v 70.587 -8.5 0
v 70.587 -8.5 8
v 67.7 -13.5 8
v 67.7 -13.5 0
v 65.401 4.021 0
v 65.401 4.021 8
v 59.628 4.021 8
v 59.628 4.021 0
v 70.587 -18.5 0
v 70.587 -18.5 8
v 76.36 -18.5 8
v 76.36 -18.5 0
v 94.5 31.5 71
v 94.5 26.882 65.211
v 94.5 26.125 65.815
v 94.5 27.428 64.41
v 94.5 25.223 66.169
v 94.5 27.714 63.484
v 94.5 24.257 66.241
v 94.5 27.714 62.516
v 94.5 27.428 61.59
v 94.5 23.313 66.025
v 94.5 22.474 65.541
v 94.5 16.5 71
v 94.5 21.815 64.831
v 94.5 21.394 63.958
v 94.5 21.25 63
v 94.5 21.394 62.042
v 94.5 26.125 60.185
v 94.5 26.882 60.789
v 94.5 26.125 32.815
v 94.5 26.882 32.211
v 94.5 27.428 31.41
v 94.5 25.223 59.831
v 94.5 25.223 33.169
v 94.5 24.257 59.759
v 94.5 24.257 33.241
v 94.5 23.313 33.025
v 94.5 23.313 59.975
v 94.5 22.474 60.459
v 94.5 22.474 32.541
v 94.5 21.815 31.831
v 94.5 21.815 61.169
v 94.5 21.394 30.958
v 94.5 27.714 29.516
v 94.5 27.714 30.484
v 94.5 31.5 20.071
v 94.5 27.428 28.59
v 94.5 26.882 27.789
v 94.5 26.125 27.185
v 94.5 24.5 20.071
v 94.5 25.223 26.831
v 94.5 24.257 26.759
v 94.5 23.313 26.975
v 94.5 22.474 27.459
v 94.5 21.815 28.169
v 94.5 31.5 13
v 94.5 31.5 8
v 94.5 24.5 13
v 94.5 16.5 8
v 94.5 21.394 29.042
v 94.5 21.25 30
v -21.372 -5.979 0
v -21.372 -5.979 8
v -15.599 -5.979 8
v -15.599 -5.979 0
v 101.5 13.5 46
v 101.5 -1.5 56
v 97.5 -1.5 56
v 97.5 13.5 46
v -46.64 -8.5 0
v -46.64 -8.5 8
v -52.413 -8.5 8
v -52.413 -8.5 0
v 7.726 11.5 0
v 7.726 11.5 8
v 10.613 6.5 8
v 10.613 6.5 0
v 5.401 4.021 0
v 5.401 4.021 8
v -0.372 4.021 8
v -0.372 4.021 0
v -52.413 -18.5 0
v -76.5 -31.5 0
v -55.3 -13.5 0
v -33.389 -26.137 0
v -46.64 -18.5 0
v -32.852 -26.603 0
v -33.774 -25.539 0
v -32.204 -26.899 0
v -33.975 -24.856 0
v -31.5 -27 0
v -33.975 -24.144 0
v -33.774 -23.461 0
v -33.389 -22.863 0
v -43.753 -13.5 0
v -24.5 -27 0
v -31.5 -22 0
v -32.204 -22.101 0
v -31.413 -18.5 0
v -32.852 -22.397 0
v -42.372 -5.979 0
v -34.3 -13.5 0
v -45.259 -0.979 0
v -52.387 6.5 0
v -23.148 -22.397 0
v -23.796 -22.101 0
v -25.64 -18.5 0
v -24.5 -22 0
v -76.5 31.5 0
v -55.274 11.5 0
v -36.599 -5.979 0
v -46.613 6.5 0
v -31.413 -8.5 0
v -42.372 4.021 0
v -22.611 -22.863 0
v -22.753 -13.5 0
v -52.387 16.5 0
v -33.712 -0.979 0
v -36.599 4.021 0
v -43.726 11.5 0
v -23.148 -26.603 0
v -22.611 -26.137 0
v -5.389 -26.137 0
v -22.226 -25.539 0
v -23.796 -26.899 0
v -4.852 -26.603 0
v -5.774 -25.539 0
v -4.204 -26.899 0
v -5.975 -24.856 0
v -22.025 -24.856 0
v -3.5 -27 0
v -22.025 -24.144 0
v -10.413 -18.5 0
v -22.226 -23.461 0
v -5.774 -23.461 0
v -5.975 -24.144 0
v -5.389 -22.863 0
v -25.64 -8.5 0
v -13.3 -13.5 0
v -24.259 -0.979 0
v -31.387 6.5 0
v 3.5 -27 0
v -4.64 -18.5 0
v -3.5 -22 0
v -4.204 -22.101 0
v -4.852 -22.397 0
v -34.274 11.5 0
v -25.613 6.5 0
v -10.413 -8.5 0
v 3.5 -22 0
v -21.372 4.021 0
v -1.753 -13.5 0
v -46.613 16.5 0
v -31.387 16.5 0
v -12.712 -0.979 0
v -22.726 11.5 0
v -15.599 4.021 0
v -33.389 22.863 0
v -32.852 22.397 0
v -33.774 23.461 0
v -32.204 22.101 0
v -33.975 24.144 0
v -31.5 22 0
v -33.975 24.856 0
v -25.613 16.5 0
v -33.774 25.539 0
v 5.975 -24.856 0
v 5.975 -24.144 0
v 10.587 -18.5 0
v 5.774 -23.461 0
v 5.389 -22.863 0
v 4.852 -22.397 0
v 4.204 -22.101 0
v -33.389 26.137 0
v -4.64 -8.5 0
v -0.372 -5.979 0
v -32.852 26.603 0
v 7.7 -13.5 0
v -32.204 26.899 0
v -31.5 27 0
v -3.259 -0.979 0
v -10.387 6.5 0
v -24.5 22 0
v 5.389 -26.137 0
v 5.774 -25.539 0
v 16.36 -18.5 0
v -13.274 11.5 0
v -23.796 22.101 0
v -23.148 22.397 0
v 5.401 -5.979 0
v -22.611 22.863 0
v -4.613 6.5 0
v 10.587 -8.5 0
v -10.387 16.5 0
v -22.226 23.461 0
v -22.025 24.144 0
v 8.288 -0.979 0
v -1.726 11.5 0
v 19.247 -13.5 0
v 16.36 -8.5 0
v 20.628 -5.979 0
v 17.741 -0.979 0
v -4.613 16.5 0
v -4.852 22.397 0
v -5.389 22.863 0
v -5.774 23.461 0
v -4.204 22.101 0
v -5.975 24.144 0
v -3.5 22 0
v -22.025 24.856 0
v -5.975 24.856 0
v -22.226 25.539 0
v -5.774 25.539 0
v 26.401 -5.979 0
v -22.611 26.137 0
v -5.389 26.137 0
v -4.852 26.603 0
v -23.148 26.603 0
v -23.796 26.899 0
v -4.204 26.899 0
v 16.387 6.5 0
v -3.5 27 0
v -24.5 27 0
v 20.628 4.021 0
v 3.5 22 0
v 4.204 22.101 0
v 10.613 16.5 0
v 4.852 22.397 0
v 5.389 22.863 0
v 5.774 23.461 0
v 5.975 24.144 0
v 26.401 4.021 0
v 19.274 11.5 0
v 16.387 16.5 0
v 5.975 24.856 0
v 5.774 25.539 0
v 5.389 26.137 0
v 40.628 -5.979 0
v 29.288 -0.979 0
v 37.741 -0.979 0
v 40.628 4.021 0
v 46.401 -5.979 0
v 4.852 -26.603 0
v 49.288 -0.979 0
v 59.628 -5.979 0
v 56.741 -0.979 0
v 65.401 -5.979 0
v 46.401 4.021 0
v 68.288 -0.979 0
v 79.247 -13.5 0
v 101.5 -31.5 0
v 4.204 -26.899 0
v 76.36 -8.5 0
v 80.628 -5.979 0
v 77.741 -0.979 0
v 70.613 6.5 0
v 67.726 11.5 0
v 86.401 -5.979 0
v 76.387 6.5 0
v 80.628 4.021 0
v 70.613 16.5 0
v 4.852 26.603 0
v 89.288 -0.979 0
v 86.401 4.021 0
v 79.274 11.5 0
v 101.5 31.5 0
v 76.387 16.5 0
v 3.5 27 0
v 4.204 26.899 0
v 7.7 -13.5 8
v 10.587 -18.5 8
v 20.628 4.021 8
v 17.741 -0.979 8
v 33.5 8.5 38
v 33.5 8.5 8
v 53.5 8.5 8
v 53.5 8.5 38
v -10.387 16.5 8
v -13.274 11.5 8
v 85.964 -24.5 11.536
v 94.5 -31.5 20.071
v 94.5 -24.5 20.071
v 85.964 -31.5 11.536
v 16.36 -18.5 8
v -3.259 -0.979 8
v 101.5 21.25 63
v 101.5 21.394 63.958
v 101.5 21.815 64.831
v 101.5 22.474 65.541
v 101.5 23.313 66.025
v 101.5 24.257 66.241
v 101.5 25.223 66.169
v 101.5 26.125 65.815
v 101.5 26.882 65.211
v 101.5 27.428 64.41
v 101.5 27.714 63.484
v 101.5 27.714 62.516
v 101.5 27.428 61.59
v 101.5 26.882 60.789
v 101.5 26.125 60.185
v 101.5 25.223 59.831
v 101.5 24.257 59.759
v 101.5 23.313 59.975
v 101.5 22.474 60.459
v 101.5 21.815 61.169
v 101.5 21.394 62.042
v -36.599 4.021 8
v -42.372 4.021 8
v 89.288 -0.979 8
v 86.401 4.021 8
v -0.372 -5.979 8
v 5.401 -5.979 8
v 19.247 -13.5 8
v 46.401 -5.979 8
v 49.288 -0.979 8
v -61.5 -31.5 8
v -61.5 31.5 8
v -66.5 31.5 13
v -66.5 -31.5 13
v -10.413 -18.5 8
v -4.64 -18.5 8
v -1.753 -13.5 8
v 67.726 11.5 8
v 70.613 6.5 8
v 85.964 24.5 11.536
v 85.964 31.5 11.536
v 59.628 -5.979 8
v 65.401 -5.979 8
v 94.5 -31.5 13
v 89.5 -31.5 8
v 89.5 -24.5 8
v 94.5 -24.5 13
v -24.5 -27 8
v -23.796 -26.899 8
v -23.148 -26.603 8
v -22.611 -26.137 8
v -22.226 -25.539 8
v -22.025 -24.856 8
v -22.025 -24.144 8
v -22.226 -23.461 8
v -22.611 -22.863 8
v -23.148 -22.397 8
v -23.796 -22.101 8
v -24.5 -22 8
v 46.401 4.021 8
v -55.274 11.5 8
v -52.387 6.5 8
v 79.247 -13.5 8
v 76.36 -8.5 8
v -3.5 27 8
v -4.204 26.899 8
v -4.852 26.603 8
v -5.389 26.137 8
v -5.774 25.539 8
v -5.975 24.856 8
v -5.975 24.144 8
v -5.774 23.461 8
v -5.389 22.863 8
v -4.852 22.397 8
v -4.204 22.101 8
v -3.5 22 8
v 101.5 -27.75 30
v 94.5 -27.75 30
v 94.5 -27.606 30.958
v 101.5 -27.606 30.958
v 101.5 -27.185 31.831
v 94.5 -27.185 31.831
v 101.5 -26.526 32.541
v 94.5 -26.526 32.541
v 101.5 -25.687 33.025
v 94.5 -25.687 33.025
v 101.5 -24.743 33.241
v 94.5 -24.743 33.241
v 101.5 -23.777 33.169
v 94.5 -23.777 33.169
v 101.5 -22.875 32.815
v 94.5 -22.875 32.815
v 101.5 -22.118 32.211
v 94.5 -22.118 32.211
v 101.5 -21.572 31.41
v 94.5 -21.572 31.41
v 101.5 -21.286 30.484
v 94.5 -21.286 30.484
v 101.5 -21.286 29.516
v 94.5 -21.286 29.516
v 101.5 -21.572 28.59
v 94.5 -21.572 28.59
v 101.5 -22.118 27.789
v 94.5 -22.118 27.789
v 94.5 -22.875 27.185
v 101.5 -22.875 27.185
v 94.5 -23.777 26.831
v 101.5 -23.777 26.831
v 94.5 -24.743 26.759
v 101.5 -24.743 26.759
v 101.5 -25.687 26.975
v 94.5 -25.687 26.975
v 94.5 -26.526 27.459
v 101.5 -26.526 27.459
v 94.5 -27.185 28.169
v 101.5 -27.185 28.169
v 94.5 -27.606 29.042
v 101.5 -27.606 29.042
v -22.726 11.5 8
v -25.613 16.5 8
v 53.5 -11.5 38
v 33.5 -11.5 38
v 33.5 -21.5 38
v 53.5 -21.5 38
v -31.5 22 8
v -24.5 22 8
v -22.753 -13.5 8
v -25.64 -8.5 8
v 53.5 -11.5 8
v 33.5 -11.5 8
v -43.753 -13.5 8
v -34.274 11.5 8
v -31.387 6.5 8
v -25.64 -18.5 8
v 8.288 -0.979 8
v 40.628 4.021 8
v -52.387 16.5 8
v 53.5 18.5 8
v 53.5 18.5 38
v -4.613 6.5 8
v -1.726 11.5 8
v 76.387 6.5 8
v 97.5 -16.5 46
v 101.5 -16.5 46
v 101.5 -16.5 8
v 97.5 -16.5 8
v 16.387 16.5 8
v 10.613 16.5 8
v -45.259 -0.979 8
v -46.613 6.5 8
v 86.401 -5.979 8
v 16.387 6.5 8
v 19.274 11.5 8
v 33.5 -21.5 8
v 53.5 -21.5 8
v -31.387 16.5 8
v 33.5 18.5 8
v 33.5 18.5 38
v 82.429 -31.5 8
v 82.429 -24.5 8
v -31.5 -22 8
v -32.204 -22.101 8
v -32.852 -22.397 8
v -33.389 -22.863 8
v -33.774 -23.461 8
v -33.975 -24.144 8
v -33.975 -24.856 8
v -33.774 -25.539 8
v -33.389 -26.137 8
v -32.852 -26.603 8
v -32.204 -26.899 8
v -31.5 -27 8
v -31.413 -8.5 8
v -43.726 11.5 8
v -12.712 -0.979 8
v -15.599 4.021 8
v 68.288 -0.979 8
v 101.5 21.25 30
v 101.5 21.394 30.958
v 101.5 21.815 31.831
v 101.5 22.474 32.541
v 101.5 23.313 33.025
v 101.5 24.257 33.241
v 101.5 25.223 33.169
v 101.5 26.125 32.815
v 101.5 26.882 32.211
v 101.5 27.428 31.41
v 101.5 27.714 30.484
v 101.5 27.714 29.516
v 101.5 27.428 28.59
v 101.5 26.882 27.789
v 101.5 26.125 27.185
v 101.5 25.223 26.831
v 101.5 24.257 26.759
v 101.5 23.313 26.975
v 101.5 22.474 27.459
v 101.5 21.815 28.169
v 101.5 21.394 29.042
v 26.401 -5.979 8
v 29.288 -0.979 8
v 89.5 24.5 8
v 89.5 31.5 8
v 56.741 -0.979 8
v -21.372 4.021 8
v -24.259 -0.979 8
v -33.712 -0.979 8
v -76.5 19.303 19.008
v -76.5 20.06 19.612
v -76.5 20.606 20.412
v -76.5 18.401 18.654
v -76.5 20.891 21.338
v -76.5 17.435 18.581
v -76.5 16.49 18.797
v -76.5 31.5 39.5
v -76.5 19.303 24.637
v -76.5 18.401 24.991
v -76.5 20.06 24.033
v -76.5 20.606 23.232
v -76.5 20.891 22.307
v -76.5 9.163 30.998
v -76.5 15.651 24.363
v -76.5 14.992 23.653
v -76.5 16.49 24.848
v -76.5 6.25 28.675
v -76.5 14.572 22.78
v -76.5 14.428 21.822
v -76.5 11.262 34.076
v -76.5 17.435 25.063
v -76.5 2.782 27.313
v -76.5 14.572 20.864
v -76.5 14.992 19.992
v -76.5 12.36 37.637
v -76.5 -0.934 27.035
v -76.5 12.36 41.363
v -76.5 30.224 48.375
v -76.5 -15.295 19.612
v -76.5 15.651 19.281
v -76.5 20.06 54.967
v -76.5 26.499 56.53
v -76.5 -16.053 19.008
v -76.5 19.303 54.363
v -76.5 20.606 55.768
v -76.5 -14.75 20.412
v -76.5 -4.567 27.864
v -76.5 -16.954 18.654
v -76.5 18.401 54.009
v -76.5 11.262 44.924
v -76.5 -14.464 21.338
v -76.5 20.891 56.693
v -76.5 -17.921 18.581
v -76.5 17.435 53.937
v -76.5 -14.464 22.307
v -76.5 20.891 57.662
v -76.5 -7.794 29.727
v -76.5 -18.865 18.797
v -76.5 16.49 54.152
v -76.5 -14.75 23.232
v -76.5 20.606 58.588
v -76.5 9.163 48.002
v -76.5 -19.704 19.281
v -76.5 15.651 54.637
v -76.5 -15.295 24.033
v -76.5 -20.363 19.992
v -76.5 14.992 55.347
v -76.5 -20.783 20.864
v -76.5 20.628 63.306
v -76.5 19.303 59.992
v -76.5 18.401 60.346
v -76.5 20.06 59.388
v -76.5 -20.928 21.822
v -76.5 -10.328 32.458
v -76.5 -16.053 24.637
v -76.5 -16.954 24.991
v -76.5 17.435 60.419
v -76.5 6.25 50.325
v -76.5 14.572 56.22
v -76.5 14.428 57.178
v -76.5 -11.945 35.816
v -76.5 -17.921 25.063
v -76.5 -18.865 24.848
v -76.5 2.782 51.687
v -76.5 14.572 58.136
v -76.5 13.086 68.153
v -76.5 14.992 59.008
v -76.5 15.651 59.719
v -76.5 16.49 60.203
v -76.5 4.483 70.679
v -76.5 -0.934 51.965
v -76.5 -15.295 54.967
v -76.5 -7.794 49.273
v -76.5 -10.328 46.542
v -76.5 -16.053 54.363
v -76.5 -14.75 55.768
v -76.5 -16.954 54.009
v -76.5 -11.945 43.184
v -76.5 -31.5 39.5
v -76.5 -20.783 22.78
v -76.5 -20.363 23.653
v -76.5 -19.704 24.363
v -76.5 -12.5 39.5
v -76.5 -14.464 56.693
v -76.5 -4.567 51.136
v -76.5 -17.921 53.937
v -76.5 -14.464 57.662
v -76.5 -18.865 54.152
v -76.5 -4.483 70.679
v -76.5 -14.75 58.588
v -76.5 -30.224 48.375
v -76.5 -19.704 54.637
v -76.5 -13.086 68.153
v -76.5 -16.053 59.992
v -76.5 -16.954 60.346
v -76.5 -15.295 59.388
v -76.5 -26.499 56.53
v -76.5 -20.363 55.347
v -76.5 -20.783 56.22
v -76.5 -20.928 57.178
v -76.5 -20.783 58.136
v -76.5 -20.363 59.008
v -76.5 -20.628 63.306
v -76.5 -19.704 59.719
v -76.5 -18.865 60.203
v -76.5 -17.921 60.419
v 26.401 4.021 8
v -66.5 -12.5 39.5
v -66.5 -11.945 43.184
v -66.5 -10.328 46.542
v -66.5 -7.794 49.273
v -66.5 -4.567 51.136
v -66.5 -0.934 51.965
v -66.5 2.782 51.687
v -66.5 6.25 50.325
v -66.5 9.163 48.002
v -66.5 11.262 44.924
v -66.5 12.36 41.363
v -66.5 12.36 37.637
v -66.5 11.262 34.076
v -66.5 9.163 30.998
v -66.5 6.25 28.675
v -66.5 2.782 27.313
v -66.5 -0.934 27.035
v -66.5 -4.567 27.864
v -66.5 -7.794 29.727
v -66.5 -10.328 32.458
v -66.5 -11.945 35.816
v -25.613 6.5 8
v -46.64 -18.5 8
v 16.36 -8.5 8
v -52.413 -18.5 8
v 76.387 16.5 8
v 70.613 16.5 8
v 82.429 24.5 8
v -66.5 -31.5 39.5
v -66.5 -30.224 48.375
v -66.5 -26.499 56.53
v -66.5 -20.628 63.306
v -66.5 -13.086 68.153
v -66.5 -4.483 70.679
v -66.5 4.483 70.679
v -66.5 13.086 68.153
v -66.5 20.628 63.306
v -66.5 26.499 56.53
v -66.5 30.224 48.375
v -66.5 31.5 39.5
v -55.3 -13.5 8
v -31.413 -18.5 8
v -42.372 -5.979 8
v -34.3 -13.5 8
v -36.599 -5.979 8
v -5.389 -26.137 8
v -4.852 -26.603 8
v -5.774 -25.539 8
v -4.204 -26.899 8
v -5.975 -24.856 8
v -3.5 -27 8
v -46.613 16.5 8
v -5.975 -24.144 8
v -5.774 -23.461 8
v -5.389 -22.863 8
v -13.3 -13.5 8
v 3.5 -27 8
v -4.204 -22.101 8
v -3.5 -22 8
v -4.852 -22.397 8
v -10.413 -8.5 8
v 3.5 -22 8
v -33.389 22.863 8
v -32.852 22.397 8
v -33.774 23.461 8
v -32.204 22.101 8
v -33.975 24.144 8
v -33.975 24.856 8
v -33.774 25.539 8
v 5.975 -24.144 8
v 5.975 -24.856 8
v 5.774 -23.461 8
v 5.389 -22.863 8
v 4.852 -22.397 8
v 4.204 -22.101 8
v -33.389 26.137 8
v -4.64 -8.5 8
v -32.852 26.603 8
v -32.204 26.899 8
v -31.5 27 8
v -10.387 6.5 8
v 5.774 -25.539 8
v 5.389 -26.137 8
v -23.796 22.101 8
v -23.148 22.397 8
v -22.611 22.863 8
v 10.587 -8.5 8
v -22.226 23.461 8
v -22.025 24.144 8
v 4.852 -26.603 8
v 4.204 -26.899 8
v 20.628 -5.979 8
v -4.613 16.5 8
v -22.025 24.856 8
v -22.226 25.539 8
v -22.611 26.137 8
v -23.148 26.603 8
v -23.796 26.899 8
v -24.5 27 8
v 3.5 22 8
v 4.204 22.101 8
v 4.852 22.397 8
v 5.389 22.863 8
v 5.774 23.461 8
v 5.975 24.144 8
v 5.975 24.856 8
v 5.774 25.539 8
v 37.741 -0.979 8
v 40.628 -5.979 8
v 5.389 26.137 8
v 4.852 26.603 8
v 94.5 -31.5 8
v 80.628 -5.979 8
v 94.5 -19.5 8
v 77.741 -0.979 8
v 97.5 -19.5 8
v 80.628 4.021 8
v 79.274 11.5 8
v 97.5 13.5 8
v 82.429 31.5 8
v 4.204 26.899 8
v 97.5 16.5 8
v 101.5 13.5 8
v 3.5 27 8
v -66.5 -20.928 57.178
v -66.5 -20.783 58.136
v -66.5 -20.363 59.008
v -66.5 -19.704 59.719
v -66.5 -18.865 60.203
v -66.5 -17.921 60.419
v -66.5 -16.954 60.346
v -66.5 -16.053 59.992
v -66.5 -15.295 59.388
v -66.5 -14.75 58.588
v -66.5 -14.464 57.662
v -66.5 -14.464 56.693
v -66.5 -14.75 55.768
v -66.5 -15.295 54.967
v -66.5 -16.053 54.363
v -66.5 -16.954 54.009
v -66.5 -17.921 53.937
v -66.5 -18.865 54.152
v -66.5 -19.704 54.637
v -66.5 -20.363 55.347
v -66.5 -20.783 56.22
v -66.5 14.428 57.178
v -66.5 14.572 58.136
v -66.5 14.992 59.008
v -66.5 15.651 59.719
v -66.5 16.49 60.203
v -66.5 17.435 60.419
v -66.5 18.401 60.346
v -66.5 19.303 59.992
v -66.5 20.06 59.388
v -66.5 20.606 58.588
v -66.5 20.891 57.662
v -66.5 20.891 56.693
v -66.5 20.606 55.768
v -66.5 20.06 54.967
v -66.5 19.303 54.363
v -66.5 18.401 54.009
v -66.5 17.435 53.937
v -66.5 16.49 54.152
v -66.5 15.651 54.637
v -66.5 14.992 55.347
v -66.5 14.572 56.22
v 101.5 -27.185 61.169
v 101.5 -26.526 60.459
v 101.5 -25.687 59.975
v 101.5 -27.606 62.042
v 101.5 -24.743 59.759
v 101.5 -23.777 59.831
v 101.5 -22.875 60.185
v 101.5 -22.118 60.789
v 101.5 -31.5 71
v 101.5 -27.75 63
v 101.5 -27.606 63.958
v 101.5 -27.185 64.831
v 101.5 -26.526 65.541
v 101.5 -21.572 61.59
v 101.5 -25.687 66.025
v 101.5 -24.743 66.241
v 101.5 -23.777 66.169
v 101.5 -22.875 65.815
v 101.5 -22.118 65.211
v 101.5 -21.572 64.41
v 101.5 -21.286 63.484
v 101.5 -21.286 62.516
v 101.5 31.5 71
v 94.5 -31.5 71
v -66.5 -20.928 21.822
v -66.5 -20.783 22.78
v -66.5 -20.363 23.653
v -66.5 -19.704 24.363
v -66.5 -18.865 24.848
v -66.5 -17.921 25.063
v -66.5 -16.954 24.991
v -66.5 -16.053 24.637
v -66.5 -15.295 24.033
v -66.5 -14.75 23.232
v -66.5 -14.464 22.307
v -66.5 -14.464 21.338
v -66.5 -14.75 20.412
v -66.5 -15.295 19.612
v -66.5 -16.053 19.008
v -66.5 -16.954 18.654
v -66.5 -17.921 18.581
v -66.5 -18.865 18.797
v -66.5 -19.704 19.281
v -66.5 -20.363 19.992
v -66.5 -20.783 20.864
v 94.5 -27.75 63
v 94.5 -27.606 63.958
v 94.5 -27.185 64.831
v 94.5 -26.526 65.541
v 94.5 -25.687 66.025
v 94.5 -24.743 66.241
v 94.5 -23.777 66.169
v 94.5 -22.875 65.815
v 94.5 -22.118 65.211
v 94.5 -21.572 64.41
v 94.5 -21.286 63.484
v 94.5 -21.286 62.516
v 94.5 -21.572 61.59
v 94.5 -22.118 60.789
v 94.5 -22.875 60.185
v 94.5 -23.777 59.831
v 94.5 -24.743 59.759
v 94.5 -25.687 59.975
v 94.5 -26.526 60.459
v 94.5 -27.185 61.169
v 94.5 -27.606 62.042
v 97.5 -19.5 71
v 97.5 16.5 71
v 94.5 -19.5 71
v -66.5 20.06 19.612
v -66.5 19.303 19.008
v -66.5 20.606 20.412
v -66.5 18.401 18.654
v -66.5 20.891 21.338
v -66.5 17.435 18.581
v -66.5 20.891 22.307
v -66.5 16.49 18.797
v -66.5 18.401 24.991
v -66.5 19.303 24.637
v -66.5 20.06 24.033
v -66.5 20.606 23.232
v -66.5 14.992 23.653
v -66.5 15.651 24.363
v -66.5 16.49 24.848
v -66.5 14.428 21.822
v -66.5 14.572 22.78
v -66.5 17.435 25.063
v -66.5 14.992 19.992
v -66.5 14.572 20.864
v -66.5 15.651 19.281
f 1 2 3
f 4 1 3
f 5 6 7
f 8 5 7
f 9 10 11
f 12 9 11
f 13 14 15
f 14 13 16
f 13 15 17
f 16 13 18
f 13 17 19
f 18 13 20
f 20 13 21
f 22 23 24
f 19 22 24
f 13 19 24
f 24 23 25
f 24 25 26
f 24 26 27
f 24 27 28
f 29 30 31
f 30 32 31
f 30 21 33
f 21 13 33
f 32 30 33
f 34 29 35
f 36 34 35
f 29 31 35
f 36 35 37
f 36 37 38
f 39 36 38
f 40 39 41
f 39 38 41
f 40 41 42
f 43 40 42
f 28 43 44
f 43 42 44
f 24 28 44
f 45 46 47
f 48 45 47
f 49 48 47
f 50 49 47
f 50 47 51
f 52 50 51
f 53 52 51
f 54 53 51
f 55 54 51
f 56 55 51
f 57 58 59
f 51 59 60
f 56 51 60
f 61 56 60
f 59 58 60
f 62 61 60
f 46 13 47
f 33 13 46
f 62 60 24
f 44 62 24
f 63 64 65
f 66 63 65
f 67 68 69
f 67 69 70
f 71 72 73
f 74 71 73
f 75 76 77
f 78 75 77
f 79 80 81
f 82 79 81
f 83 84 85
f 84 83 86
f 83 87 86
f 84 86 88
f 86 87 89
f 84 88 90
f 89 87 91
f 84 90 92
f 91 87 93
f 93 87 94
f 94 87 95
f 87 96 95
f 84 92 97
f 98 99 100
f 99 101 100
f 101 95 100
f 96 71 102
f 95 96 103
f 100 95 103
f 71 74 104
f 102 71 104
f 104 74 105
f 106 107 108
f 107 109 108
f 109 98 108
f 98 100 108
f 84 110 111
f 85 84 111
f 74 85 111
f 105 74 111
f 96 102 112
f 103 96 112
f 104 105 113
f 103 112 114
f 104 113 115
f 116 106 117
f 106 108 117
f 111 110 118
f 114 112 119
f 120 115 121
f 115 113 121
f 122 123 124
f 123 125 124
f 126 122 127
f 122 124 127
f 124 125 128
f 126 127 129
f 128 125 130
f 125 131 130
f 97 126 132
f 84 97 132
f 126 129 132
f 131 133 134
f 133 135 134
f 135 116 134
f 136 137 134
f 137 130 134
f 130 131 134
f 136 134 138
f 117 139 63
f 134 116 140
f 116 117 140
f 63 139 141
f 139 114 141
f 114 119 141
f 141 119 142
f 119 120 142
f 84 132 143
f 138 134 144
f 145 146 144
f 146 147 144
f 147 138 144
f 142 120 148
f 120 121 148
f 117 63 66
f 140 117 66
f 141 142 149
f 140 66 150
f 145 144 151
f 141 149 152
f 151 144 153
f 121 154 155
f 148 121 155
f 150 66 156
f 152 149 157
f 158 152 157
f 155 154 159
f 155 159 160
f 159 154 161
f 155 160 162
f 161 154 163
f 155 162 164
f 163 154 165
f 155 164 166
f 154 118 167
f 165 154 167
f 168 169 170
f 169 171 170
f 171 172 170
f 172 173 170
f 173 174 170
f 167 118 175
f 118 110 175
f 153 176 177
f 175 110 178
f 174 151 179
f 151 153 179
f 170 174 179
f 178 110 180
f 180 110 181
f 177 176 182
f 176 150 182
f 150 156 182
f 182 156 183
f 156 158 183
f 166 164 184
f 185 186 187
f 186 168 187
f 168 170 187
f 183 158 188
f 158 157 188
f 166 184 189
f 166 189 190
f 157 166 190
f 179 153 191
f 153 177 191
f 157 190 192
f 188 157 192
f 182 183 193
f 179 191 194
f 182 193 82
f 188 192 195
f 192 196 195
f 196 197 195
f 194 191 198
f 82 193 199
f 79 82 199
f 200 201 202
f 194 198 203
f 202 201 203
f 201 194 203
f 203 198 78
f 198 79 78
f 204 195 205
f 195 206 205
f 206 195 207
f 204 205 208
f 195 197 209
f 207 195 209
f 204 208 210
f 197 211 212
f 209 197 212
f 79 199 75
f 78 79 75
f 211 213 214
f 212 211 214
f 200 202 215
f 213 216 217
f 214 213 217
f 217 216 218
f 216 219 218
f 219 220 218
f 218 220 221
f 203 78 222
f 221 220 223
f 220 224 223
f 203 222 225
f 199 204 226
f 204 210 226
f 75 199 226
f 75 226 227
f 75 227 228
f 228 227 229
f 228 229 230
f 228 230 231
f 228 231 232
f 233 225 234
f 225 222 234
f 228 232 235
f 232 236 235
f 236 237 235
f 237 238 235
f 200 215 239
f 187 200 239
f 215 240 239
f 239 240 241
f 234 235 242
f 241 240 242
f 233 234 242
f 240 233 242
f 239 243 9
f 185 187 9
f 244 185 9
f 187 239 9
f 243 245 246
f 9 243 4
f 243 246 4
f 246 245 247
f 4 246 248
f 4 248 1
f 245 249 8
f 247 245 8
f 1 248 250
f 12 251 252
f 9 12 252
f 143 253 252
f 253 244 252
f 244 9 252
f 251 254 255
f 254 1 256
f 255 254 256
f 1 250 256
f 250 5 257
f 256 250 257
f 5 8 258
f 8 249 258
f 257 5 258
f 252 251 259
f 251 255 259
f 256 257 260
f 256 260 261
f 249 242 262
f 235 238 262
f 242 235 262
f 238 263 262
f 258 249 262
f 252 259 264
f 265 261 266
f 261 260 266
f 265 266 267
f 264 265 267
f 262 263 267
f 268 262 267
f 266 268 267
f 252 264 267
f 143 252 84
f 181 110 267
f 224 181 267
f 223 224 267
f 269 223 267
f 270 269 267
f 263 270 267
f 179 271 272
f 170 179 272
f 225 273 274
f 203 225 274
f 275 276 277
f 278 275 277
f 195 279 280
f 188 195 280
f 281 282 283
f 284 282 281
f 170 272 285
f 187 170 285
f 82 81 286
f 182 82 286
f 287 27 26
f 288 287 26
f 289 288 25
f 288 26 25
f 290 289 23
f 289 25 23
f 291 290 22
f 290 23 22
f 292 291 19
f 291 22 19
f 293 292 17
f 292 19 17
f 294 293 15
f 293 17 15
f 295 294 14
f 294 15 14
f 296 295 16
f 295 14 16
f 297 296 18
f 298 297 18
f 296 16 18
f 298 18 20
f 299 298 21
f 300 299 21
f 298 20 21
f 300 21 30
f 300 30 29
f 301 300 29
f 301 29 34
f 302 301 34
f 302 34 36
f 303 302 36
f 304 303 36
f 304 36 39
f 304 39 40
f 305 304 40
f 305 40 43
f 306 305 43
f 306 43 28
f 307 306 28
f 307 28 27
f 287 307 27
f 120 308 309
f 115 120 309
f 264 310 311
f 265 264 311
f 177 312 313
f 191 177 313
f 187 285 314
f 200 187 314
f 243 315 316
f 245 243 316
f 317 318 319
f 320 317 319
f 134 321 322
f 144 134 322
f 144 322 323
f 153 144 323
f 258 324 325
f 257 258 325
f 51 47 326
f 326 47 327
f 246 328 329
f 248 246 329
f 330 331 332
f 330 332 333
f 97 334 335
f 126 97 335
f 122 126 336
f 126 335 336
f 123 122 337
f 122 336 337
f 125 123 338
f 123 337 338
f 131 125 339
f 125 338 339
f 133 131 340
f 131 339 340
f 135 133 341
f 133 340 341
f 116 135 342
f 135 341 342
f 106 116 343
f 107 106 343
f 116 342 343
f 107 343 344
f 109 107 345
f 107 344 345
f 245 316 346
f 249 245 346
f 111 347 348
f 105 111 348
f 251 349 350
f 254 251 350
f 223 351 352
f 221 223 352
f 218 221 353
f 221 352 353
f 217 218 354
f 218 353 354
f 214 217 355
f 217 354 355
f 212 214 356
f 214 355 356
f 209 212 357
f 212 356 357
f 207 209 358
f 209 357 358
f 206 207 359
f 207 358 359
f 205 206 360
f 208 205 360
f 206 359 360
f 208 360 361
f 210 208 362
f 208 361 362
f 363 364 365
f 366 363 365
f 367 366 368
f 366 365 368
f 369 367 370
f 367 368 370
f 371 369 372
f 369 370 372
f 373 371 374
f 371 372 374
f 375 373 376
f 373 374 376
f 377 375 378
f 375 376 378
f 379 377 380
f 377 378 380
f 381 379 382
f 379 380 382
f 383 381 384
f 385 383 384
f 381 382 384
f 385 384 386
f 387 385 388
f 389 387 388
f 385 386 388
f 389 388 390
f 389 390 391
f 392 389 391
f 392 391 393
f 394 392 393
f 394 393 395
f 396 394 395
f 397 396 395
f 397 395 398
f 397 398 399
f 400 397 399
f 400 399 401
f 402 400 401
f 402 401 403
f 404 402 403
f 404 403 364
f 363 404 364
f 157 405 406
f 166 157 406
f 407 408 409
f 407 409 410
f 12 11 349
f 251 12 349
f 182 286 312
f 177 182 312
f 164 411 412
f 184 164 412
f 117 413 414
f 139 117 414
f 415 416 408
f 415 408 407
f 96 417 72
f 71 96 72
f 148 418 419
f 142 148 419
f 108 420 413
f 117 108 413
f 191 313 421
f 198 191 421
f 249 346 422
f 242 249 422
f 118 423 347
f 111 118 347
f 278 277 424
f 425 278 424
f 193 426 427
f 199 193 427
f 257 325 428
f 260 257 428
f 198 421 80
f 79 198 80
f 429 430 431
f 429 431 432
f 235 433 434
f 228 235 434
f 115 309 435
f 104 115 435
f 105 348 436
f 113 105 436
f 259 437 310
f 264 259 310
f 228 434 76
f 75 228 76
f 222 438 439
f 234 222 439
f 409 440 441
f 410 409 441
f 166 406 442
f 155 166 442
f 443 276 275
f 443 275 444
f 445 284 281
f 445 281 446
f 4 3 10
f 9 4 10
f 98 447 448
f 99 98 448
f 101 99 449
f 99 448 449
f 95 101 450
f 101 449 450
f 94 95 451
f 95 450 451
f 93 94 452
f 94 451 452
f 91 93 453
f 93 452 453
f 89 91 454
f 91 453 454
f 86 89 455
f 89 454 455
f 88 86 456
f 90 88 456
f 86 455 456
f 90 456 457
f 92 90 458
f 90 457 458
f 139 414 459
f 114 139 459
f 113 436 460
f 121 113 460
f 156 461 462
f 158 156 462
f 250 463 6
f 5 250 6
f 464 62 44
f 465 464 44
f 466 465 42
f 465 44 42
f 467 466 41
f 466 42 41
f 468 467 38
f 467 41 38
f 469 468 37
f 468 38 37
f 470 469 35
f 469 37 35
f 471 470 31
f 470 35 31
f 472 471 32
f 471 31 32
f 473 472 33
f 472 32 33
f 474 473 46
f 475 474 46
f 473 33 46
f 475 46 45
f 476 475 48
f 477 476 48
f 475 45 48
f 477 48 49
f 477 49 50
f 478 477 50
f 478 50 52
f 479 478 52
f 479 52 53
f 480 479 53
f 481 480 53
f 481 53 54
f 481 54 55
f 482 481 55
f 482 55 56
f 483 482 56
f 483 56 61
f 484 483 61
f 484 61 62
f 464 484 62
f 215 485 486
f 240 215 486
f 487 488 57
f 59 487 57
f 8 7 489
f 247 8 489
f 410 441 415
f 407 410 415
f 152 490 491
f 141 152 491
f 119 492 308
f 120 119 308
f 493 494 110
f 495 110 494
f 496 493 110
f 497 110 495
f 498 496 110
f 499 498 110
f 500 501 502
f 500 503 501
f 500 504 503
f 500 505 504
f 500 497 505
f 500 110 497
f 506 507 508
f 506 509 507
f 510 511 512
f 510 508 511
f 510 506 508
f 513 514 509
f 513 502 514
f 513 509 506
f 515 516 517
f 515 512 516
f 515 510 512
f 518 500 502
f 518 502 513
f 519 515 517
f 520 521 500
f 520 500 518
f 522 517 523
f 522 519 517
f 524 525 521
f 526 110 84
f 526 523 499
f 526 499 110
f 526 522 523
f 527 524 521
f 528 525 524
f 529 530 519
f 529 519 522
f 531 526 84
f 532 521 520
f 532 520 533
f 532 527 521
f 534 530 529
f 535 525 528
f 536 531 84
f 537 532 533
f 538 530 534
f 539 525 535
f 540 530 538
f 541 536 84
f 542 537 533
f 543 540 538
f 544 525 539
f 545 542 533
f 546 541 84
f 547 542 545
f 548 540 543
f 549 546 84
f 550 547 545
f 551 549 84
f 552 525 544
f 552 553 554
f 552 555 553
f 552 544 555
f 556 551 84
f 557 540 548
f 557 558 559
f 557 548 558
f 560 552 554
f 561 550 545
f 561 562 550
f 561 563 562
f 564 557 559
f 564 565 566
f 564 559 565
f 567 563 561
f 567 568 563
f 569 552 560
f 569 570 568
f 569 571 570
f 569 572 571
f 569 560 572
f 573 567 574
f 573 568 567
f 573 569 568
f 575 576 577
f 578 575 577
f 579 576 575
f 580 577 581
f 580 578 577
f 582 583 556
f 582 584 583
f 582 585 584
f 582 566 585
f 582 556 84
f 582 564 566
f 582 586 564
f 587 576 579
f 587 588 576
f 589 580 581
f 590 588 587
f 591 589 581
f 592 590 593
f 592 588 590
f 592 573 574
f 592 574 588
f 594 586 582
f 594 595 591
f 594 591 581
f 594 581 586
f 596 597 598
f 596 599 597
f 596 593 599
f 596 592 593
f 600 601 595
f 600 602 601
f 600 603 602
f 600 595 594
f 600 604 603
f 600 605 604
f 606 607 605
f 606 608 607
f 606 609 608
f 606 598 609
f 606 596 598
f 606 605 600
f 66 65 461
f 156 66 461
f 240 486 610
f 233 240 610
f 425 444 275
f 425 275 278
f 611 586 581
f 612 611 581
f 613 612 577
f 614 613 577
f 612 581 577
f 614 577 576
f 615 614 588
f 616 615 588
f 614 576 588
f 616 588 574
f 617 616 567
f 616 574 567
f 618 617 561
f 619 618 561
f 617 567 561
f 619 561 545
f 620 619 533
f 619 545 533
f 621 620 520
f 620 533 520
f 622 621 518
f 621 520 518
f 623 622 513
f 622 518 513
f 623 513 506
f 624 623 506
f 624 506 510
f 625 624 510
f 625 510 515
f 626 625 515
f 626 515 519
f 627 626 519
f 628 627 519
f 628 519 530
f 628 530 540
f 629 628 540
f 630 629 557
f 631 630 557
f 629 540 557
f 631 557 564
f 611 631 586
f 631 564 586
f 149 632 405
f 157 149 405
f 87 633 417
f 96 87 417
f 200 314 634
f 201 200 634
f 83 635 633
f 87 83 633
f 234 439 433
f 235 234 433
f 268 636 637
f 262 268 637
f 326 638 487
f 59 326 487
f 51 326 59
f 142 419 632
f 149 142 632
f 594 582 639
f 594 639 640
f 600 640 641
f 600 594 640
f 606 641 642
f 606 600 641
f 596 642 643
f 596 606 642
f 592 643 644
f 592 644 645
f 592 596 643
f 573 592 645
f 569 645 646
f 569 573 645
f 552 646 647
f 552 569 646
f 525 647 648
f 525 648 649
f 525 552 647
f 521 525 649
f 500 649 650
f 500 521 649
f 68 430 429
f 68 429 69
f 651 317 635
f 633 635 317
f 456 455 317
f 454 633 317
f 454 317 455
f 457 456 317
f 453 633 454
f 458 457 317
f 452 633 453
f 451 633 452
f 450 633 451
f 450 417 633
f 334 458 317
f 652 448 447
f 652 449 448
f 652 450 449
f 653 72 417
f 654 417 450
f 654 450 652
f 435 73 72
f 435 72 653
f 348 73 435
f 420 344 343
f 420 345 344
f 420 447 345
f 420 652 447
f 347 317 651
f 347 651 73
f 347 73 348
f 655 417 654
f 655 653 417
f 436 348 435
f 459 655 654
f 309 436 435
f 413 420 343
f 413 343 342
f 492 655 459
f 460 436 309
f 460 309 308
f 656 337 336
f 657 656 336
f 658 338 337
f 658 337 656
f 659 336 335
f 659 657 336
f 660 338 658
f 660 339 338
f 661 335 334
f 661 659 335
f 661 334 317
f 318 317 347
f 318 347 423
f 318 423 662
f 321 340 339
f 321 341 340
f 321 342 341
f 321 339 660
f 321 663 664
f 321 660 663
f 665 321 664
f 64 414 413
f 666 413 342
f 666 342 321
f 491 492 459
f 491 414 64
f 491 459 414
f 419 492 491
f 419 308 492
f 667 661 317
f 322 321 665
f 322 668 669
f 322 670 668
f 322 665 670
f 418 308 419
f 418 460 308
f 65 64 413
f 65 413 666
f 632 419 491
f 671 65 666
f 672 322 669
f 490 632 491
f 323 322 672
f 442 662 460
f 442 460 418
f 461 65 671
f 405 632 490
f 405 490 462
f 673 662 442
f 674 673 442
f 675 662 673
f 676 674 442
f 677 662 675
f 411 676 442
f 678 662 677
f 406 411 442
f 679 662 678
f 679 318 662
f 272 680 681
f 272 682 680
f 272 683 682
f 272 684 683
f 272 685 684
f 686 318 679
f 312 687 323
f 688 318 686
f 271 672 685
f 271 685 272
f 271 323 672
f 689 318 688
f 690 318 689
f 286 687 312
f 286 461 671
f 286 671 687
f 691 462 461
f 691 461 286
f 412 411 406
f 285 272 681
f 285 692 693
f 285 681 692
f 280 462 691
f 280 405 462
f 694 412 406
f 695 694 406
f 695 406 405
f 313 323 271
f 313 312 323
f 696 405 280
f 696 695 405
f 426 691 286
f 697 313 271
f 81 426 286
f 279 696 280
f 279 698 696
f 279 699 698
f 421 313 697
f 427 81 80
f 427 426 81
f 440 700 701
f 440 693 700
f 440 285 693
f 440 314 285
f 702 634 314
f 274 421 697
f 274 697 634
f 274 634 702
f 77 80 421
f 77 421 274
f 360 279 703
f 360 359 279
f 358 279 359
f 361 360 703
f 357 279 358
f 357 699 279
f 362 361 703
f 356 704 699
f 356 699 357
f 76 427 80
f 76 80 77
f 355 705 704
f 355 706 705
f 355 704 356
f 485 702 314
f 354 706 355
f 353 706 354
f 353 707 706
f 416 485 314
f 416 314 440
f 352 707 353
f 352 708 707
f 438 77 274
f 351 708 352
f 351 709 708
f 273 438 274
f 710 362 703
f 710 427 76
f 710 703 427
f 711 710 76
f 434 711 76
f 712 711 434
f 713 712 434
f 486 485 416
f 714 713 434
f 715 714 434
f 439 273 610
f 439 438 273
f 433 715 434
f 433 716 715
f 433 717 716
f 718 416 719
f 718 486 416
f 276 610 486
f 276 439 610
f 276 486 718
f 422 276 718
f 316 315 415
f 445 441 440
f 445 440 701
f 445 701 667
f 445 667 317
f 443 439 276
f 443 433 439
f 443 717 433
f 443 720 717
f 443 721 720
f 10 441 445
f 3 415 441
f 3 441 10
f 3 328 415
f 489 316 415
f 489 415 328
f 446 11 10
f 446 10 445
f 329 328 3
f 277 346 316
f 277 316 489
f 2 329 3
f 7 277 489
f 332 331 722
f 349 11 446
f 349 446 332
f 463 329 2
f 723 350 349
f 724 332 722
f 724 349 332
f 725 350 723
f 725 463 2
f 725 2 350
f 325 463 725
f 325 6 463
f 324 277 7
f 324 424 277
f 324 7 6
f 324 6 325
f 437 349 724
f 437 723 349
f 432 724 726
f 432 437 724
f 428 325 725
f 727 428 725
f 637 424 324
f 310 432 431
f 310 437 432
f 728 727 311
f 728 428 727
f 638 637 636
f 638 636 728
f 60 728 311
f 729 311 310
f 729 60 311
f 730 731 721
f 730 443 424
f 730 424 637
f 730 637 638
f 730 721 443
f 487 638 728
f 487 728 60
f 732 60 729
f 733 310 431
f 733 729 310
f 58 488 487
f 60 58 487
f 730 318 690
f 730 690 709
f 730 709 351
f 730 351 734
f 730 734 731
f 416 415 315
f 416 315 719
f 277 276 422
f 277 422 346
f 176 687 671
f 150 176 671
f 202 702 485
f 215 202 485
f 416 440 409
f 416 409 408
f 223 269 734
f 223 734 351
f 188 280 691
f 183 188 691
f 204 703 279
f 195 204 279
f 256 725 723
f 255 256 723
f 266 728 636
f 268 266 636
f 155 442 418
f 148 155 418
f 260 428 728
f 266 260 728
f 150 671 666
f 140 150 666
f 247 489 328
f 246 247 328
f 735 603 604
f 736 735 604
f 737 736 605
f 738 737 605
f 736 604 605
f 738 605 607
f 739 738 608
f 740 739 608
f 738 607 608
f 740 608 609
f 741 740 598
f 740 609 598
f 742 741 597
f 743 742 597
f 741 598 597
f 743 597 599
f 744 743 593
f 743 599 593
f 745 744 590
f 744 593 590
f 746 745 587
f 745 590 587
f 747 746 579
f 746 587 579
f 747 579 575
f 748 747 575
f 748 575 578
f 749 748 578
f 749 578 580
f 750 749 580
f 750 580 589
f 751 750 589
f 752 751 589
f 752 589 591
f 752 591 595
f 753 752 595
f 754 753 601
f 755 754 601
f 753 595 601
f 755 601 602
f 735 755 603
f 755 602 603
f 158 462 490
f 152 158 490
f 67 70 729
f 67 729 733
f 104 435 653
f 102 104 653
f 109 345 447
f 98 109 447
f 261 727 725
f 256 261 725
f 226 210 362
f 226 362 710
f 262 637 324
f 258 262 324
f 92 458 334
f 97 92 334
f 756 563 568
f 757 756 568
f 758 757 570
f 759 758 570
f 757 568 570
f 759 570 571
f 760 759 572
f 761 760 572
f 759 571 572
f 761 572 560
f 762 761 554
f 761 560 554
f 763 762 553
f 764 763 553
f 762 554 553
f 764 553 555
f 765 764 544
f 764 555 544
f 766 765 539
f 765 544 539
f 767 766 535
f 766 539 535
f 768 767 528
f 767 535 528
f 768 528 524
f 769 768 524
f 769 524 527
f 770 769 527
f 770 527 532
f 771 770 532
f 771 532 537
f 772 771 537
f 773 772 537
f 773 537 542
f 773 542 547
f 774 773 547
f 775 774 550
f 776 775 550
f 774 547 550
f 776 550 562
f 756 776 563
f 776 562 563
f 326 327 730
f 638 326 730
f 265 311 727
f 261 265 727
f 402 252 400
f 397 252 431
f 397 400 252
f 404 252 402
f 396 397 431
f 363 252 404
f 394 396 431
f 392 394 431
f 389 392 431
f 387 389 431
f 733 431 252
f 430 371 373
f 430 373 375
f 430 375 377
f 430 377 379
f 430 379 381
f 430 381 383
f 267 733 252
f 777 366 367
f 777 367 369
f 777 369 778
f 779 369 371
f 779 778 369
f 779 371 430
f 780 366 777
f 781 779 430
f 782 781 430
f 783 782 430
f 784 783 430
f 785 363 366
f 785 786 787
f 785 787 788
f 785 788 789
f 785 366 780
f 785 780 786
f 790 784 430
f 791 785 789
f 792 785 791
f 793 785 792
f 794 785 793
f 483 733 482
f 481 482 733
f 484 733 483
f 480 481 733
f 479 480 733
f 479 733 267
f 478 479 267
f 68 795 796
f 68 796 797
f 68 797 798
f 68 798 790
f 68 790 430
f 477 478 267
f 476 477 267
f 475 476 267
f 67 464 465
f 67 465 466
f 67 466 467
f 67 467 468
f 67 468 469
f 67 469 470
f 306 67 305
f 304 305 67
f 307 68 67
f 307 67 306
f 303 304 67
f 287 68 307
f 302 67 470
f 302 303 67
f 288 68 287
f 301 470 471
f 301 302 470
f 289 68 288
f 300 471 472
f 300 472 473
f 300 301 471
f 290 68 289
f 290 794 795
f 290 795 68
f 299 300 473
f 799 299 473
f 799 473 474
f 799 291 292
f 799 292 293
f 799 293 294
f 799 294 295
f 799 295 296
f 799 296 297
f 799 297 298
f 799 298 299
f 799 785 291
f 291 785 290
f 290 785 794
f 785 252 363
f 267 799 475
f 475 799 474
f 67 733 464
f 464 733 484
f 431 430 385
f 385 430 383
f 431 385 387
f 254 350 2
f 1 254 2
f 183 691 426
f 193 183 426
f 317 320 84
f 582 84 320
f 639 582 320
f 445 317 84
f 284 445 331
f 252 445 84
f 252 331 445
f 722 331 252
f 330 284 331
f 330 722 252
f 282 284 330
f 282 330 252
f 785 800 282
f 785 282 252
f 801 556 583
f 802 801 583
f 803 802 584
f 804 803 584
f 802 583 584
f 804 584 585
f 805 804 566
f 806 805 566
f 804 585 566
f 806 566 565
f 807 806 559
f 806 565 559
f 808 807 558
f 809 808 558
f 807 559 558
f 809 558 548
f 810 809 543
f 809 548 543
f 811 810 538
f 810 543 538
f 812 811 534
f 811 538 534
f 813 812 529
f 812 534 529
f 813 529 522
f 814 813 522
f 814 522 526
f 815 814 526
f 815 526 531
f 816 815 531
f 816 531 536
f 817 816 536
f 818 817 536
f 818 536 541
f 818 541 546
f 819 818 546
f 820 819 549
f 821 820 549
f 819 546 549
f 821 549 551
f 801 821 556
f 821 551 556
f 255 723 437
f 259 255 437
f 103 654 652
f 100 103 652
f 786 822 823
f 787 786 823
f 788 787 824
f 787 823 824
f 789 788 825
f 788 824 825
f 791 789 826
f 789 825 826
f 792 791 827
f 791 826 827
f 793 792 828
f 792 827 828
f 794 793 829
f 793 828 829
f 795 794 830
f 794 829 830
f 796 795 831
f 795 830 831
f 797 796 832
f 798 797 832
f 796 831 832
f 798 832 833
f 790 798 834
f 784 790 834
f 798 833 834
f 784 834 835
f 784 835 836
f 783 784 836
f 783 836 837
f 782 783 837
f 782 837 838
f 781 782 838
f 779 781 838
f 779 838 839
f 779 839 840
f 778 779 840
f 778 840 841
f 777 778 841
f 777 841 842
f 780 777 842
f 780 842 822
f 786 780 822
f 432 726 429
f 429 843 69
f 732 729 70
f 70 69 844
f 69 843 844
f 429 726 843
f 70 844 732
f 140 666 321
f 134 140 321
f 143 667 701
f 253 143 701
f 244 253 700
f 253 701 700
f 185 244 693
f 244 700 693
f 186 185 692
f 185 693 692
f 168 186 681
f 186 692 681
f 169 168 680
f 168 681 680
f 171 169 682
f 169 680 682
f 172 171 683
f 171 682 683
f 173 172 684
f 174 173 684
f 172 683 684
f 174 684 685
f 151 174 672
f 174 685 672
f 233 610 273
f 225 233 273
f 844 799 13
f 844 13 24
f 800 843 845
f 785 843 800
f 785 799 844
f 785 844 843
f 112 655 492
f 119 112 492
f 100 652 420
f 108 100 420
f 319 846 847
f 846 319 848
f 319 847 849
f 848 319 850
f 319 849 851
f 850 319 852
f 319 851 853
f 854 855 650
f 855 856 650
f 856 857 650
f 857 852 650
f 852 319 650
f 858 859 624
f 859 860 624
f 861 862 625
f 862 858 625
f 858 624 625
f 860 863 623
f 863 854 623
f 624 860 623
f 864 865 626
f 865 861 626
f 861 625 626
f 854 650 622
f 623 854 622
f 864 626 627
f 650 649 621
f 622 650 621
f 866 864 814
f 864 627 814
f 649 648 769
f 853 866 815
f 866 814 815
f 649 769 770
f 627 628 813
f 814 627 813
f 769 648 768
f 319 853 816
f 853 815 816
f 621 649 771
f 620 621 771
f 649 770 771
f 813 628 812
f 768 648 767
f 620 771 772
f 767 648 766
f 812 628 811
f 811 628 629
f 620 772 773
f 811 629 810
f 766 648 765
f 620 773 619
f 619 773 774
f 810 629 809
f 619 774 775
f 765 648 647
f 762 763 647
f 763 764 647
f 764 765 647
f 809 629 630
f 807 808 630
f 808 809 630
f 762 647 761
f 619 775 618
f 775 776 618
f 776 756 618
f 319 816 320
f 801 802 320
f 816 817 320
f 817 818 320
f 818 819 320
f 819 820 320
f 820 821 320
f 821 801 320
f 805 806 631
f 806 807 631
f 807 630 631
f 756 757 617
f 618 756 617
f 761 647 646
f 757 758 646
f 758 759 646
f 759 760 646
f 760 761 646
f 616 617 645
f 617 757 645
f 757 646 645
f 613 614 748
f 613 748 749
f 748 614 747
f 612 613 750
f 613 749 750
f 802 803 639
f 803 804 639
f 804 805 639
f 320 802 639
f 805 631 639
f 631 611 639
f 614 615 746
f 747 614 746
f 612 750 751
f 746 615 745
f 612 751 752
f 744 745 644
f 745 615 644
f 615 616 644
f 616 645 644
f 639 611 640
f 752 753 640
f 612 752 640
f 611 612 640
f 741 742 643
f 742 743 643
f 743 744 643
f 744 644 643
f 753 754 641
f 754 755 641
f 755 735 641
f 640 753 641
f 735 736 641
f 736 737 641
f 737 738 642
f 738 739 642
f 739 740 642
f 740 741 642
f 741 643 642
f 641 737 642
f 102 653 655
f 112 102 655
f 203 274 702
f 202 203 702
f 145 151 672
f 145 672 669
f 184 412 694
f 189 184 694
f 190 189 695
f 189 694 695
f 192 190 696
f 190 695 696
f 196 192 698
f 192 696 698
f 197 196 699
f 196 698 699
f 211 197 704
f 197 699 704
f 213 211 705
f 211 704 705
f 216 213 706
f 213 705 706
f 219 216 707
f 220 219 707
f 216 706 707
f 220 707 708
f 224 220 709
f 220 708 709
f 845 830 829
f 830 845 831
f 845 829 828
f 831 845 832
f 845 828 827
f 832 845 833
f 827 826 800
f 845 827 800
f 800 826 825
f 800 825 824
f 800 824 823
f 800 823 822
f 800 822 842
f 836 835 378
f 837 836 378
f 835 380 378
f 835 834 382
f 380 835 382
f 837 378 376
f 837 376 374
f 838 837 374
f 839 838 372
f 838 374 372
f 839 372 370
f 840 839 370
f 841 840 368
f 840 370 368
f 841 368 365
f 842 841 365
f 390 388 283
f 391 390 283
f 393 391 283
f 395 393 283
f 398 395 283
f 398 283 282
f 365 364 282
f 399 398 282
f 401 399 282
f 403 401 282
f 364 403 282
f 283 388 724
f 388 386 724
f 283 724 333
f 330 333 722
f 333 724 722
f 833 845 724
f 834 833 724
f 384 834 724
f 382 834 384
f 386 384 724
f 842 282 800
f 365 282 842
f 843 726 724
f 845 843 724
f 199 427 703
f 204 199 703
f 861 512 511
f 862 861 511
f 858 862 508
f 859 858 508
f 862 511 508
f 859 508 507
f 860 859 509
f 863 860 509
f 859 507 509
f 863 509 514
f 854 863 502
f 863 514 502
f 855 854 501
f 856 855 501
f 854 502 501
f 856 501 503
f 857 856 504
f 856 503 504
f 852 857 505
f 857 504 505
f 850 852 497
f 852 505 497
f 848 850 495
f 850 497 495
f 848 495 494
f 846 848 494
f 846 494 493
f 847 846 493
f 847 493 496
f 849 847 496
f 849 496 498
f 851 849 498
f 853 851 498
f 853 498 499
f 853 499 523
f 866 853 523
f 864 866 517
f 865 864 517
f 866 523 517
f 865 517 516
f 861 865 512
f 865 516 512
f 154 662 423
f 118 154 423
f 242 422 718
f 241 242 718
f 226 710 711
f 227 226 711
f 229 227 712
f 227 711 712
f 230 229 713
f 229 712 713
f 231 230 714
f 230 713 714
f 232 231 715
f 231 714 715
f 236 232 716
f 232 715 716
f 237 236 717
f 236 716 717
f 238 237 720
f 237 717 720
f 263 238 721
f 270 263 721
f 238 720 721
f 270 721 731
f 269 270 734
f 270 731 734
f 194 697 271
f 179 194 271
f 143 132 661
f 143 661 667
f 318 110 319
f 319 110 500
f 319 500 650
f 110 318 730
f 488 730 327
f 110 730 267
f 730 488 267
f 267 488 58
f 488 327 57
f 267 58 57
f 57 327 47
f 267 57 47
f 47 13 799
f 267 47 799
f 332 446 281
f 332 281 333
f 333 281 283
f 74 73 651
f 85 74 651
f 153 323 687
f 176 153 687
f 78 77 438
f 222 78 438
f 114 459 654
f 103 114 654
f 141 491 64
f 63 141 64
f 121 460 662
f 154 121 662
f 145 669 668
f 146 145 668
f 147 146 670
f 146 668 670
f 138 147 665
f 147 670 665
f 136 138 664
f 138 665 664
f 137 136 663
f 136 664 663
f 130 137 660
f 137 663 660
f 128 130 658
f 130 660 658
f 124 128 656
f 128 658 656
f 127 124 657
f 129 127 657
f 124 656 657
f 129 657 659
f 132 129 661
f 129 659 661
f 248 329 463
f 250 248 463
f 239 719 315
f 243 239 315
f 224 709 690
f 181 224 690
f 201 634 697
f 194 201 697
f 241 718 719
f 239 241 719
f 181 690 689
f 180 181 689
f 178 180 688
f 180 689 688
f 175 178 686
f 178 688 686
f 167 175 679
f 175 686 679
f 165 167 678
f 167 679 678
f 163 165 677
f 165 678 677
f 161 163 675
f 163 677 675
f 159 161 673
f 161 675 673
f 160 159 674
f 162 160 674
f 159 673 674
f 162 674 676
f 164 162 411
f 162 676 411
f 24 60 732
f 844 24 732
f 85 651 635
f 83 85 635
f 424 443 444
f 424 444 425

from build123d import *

# Parameters (mm, degrees)
F1_DEPTH  = 8
F2_R      = 3.25
F2_R_2    = 12.5
F3_DEPTH  = 10
F4_W      = 20
F4_H      = 10
F5_DEPTH  = 30
F7_DEPTH  = 63
F9_DEPTH  = 4
F11_DEPTH = 7
F13_D     = 6.5
F13_DEPTH = 15
F13_TIP   = 1.9527970118
F15_DEPTH = 63
F17_DEPTH = 8
F19_DEPTH = 8


# Not quite as in the source:
# - a pattern or mirror of a feature is missing from the dataset's text; its kind, count and spacing are read off the source's solid


with BuildPart() as f1:
    # F0 (on Top) → F1 (new body)
    with BuildSketch(Plane.XY):
        Polygon((76.5, 31.5), (-76.5, 31.5), (-76.5, -31.5), (76.5, -31.5), (101.5, -31.5), (101.5, 31.5), align=None)
    extrude(amount=F1_DEPTH)

    # F2 (on face) → F3 (join)
    with BuildSketch(Plane(origin=(-76.5, 0, 0), x_dir=(0, -1, 0), z_dir=(-1, 0, 0))):
        with BuildLine():
            Line((31.5, 8), (31.5, 39.5))
            ThreePointArc((31.5, 39.5), (0, 71), (-31.5, 39.5))
            Line((-31.5, 39.5), (-31.5, 8))
            Line((-31.5, 8), (31.5, 8))
        make_face()
        with Locations((-17.6776695297, 21.8223304703)):
            Circle(F2_R, mode=Mode.SUBTRACT)
        with Locations((17.6776695297, 21.8223304703)):
            Circle(F2_R, mode=Mode.SUBTRACT)
        with Locations((0, 39.5)):
            Circle(F2_R_2, mode=Mode.SUBTRACT)
        with Locations((-17.6776695297, 57.1776695297)):
            Circle(F2_R, mode=Mode.SUBTRACT)
        with Locations((17.6776695297, 57.1776695297)):
            Circle(F2_R, mode=Mode.SUBTRACT)
    extrude(amount=-F3_DEPTH)

    # F4 (on face) → F5 (join)
    with BuildSketch(Plane.XY.offset(8)):
        with Locations((43.5, 13.5)):
            Rectangle(F4_W, F4_H)
        with Locations((43.5, -16.5)):
            Rectangle(F4_W, F4_H)
    extrude(amount=F5_DEPTH)

    # F6 (on face) → F7 (join)
    with BuildSketch(Plane.XY.offset(8)):
        Polygon((97.5, 13.5), (101.5, 13.5), (101.5, 31.5), (94.5, 31.5), (94.5, 16.5), (97.5, 16.5), align=None)
        Polygon((94.5, -31.5), (101.5, -31.5), (101.5, -16.5), (97.5, -16.5), (97.5, -19.5), (94.5, -19.5), align=None)
    extrude(amount=F7_DEPTH)

    # F8 (on face) → F9 (join, through all)
    with BuildSketch(Plane.YZ.offset(101.5)):
        Polygon((13.5, 71), (-16.5, 71), (-16.5, 46), (-1.5, 56), (13.5, 46), align=None)
    extrude(amount=-F9_DEPTH)

    # F10 (on face) → F11 (join)
    with BuildSketch(Plane.XZ.offset(31.5)):
        Polygon((89.5, 8), (94.5, 13), (94.5, 20.0710678119), (85.9644660941, 11.5355339059), (82.4289321881, 8), align=None)
    f11 = extrude(amount=-F11_DEPTH)

    # F11_copies: F11 across plane
    add(f11.mirror(Plane.ZX))

    # F13
    with Locations(Plane.YZ.offset(101.5)):
        with Locations((-24.5, 63), (24.5, 63), (24.5, 30), (-24.5, 30)):
            Hole(F13_D / 2, depth=F13_DEPTH)
            with Locations((0, 0, -(F13_DEPTH + F13_TIP / 2))):  # 118° drill point
                Cone(0, F13_D / 2, F13_TIP, mode=Mode.SUBTRACT)

    # F14 (on face) → F15 (join)
    with BuildSketch(Plane.XZ.offset(31.5)):
        Polygon((-66.5, 13), (-66.5, 8), (-61.5, 8), align=None)
    extrude(amount=-F15_DEPTH)

    # F16 (on face) → F17 (cut)
    with BuildSketch(Plane.XY.offset(8)):
        with BuildLine():
            ThreePointArc((-24.5, 22), (-22, 24.5), (-24.5, 27))
            Line((-24.5, 27), (-31.5, 27))
            ThreePointArc((-31.5, 27), (-34, 24.5), (-31.5, 22))
            Line((-31.5, 22), (-24.5, 22))
        make_face()
        with BuildLine():
            ThreePointArc((3.5, 22), (6, 24.5), (3.5, 27))
            Line((3.5, 27), (-3.5, 27))
            ThreePointArc((-3.5, 27), (-6, 24.5), (-3.5, 22))
            Line((-3.5, 22), (3.5, 22))
        make_face()
        with BuildLine():
            ThreePointArc((3.5, -27), (6, -24.5), (3.5, -22))
            Line((3.5, -22), (-3.5, -22))
            ThreePointArc((-3.5, -22), (-6, -24.5), (-3.5, -27))
            Line((-3.5, -27), (3.5, -27))
        make_face()
        with BuildLine():
            ThreePointArc((-24.5, -27), (-22, -24.5), (-24.5, -22))
            Line((-24.5, -22), (-31.5, -22))
            ThreePointArc((-31.5, -22), (-34, -24.5), (-31.5, -27))
            Line((-31.5, -27), (-24.5, -27))
        make_face()
    extrude(amount=-F17_DEPTH, mode=Mode.SUBTRACT)

    # F18 (on face) → F19 (cut)
    with BuildSketch(Plane.XY.offset(8)):
        Polygon((-49.5, 16.5), (-52.3867513459, 16.5), (-55.2735026919, 11.5), (-49.5, 11.5), align=None)
        Polygon((-46.6132486541, 16.5), (-49.5, 16.5), (-49.5, 11.5), (-55.2735026919, 11.5), (-52.3867513459, 6.5), (-46.6132486541, 6.5), (-43.7264973081, 11.5), align=None)
        Polygon((-42.3724755983, 4.0214471492), (-45.2592269442, -0.9785528508), (-42.3724755983, -5.9785528508), (-36.5989729064, -5.9785528508), (-33.7122215604, -0.9785528508), (-36.5989729064, 4.0214471492), align=None)
        Polygon((-31.3867513459, 16.5), (-34.2735026919, 11.5), (-31.3867513459, 6.5), (-25.6132486541, 6.5), (-22.7264973081, 11.5), (-25.6132486541, 16.5), align=None)
        Polygon((-21.3724755983, 4.0214471492), (-24.2592269442, -0.9785528508), (-21.3724755983, -5.9785528508), (-15.5989729064, -5.9785528508), (-12.7122215604, -0.9785528508), (-15.5989729064, 4.0214471492), align=None)
        Polygon((-10.3867513459, 16.5), (-13.2735026919, 11.5), (-10.3867513459, 6.5), (-4.6132486541, 6.5), (-1.7264973081, 11.5), (-4.6132486541, 16.5), align=None)
        Polygon((-0.3724755983, 4.0214471492), (-3.2592269442, -0.9785528508), (-0.3724755983, -5.9785528508), (5.4010270936, -5.9785528508), (8.2877784396, -0.9785528508), (5.4010270936, 4.0214471492), align=None)
        Polygon((10.6132486541, 16.5), (7.7264973081, 11.5), (10.6132486541, 6.5), (16.3867513459, 6.5), (19.2735026919, 11.5), (16.3867513459, 16.5), align=None)
        Polygon((20.6275244017, 4.0214471492), (17.7407730558, -0.9785528508), (20.6275244017, -5.9785528508), (26.4010270936, -5.9785528508), (29.2877784396, -0.9785528508), (26.4010270936, 4.0214471492), align=None)
        Polygon((-52.4131430724, -8.4999860695), (-55.2998944183, -13.4999860695), (-52.4131430724, -18.4999860695), (-46.6396403805, -18.4999860695), (-43.7528890345, -13.4999860695), (-46.6396403805, -8.4999860695), align=None)
        Polygon((-31.4131430724, -8.4999860695), (-34.2998944183, -13.4999860695), (-31.4131430724, -18.4999860695), (-25.6396403805, -18.4999860695), (-22.7528890345, -13.4999860695), (-25.6396403805, -8.4999860695), align=None)
        Polygon((-10.4131430724, -8.4999860695), (-13.2998944183, -13.4999860695), (-10.4131430724, -18.4999860695), (-4.6396403805, -18.4999860695), (-1.7528890345, -13.4999860695), (-4.6396403805, -8.4999860695), align=None)
        Polygon((10.5868569276, -8.4999860695), (7.7001055817, -13.4999860695), (10.5868569276, -18.4999860695), (16.3603596195, -18.4999860695), (19.2471109655, -13.4999860695), (16.3603596195, -8.4999860695), align=None)
        Polygon((77.7407730558, -0.9785528508), (80.6275244017, -5.9785528508), (86.4010270936, -5.9785528508), (89.2877784396, -0.9785528508), (86.4010270936, 4.0214471492), (80.6275244017, 4.0214471492), align=None)
        Polygon((79.2471109655, -13.4999860695), (76.3603596195, -8.4999860695), (70.5868569276, -8.4999860695), (67.7001055817, -13.4999860695), (70.5868569276, -18.4999860695), (76.3603596195, -18.4999860695), align=None)
        Polygon((76.3867513459, 16.5), (70.6132486541, 16.5), (67.7264973081, 11.5), (70.6132486541, 6.5), (76.3867513459, 6.5), (79.2735026919, 11.5), align=None)
        Polygon((68.2877784396, -0.9785528508), (65.4010270936, 4.0214471492), (59.6275244017, 4.0214471492), (56.7407730558, -0.9785528508), (59.6275244017, -5.9785528508), (65.4010270936, -5.9785528508), align=None)
        Polygon((37.7407730558, -0.9785528508), (40.6275244017, -5.9785528508), (46.4010270936, -5.9785528508), (49.2877784396, -0.9785528508), (46.4010270936, 4.0214471492), (40.6275244017, 4.0214471492), align=None)
    extrude(amount=-F19_DEPTH, mode=Mode.SUBTRACT)


solid = f1.part
